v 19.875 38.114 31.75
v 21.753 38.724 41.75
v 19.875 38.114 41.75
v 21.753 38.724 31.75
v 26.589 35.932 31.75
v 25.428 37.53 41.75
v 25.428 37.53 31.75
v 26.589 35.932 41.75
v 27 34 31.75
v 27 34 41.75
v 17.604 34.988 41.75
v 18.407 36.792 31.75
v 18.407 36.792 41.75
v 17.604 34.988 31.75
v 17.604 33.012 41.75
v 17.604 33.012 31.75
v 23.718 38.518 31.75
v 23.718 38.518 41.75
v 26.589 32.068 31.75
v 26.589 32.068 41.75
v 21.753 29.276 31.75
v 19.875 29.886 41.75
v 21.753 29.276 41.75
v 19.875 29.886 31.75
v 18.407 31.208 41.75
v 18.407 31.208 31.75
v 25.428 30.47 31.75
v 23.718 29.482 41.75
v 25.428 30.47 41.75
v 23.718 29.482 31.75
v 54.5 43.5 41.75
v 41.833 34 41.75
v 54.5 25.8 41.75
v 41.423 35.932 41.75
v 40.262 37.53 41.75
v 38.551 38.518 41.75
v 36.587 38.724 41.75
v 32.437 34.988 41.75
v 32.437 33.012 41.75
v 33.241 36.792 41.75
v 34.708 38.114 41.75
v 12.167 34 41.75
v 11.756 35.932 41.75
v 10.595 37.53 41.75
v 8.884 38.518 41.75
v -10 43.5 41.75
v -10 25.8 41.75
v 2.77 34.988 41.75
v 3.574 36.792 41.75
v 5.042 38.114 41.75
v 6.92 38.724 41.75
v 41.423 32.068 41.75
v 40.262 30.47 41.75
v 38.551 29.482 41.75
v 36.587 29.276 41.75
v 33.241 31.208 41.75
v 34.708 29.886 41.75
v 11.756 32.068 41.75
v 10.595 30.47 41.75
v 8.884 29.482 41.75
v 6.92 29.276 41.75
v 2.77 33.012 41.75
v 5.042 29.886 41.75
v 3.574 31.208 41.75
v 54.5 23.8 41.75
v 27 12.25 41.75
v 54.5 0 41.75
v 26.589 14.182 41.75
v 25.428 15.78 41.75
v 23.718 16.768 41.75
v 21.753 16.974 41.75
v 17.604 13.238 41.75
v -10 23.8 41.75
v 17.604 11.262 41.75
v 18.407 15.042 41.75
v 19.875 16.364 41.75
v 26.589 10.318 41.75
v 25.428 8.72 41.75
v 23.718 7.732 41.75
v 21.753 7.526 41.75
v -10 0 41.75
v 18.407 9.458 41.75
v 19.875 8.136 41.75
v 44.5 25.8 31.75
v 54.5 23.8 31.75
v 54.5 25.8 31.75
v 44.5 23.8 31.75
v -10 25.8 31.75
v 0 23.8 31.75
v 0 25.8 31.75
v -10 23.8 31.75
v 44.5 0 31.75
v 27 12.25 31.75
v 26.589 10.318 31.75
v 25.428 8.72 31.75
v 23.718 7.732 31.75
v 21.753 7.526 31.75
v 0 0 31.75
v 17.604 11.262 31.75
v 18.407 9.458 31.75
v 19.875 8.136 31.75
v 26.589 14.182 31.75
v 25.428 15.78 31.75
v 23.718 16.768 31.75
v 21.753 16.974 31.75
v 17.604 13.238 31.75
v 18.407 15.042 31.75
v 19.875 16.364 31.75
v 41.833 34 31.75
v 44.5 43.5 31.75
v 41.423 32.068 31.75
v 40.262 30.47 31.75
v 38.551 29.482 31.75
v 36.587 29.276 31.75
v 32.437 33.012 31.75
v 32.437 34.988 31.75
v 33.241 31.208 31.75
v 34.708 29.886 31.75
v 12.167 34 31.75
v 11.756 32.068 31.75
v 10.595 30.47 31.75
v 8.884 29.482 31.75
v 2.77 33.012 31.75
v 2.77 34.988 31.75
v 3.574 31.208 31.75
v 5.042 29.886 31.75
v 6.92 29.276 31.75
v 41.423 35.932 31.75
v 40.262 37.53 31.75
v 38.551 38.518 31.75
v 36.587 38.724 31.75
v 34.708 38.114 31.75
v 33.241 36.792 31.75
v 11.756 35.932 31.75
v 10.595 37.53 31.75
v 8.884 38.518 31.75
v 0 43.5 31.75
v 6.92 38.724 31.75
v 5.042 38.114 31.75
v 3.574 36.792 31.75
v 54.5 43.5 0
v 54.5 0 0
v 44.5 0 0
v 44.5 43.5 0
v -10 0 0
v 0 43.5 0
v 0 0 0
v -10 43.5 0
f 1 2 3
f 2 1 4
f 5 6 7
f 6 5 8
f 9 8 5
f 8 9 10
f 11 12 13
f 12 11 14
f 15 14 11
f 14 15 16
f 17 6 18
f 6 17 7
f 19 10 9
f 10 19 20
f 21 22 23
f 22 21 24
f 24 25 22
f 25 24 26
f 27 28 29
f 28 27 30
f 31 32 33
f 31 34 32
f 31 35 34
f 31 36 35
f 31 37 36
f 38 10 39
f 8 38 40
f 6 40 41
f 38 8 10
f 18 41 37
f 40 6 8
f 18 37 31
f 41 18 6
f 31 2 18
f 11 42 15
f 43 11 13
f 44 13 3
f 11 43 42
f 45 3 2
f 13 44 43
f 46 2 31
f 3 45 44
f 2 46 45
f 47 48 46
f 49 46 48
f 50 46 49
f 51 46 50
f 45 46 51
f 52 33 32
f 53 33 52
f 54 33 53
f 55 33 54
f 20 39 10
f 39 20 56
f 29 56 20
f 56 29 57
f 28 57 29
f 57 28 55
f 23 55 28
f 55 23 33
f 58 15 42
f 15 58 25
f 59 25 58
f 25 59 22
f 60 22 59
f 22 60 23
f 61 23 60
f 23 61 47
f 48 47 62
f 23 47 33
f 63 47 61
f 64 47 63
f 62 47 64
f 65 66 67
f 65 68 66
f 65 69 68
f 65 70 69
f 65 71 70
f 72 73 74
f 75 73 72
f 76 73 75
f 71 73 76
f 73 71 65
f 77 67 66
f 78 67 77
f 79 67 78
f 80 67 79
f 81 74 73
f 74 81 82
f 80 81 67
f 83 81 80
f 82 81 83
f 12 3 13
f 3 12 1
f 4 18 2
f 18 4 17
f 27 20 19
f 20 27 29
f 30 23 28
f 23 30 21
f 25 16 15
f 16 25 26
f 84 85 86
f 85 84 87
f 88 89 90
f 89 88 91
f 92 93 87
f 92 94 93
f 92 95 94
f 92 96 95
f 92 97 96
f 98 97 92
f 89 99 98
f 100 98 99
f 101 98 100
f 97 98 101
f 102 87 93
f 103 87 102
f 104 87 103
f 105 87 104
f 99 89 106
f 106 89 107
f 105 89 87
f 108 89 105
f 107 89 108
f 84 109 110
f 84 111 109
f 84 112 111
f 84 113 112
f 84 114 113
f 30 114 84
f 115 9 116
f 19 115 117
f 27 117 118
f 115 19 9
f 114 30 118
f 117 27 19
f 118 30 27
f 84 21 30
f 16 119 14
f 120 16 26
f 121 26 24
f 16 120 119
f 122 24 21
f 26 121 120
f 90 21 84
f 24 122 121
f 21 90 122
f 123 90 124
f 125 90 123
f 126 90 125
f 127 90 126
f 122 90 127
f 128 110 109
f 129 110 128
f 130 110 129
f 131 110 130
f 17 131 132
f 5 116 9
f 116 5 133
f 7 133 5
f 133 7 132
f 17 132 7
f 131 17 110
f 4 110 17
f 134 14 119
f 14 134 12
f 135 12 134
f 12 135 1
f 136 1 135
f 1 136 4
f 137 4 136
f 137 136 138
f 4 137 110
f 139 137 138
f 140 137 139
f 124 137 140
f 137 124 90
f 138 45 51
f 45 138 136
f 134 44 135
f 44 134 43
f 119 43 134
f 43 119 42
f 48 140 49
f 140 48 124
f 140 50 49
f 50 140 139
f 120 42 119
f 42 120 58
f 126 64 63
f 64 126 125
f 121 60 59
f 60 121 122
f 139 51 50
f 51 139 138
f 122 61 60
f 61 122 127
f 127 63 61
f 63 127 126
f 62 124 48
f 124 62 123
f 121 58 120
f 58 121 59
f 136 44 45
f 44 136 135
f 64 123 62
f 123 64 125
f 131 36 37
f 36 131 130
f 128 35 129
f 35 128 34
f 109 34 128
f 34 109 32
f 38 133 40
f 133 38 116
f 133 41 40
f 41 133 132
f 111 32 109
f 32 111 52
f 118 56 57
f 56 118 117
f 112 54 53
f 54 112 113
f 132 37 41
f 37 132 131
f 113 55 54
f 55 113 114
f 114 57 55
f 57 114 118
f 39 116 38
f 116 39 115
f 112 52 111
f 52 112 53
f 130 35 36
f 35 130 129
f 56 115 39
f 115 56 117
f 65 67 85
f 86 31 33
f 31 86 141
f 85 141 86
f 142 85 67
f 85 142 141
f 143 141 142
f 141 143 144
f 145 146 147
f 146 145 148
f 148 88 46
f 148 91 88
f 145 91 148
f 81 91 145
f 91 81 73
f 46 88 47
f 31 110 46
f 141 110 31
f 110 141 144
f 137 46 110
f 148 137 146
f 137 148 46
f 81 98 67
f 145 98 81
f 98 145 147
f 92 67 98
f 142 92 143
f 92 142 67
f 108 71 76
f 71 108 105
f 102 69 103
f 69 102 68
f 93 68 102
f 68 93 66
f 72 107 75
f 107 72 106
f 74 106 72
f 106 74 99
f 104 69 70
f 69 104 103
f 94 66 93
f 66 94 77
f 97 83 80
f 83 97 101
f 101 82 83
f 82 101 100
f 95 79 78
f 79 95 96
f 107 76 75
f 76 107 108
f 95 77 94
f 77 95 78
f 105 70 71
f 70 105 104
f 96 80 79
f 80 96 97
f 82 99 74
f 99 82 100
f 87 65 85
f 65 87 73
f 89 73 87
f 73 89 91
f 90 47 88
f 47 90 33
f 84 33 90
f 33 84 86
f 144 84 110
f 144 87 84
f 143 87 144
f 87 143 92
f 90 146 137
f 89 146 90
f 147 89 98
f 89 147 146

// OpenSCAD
wall=10;
w=44.5;
h=31.75;
axelDistFromRear=24.5;
weigthDia=9.5;

difference(){
    difference(){
        translate([-wall,0,0])
            cube([2*wall+w,axelDistFromRear+2*weigthDia,h+wall]);
        //back hole
        translate([w/2,axelDistFromRear/2,h])
            cylinder(d=9.5,h=wall);
        
        //front holes
        translate([w/2,axelDistFromRear+weigthDia,h]){
            cylinder(d=9.5,h=wall);
            translate([-w/3,0,0]) cylinder(d=9.5,h=wall);
            translate([w/3,0,0]) cylinder(d=9.5,h=wall);
        }
        
        //axel guide
        translate([-wall,axelDistFromRear-.7,h+wall])
            rotate([0,90,0]) #cube([wall,2,w+2*wall]);
    }

    cube([w,180,h]);
}
